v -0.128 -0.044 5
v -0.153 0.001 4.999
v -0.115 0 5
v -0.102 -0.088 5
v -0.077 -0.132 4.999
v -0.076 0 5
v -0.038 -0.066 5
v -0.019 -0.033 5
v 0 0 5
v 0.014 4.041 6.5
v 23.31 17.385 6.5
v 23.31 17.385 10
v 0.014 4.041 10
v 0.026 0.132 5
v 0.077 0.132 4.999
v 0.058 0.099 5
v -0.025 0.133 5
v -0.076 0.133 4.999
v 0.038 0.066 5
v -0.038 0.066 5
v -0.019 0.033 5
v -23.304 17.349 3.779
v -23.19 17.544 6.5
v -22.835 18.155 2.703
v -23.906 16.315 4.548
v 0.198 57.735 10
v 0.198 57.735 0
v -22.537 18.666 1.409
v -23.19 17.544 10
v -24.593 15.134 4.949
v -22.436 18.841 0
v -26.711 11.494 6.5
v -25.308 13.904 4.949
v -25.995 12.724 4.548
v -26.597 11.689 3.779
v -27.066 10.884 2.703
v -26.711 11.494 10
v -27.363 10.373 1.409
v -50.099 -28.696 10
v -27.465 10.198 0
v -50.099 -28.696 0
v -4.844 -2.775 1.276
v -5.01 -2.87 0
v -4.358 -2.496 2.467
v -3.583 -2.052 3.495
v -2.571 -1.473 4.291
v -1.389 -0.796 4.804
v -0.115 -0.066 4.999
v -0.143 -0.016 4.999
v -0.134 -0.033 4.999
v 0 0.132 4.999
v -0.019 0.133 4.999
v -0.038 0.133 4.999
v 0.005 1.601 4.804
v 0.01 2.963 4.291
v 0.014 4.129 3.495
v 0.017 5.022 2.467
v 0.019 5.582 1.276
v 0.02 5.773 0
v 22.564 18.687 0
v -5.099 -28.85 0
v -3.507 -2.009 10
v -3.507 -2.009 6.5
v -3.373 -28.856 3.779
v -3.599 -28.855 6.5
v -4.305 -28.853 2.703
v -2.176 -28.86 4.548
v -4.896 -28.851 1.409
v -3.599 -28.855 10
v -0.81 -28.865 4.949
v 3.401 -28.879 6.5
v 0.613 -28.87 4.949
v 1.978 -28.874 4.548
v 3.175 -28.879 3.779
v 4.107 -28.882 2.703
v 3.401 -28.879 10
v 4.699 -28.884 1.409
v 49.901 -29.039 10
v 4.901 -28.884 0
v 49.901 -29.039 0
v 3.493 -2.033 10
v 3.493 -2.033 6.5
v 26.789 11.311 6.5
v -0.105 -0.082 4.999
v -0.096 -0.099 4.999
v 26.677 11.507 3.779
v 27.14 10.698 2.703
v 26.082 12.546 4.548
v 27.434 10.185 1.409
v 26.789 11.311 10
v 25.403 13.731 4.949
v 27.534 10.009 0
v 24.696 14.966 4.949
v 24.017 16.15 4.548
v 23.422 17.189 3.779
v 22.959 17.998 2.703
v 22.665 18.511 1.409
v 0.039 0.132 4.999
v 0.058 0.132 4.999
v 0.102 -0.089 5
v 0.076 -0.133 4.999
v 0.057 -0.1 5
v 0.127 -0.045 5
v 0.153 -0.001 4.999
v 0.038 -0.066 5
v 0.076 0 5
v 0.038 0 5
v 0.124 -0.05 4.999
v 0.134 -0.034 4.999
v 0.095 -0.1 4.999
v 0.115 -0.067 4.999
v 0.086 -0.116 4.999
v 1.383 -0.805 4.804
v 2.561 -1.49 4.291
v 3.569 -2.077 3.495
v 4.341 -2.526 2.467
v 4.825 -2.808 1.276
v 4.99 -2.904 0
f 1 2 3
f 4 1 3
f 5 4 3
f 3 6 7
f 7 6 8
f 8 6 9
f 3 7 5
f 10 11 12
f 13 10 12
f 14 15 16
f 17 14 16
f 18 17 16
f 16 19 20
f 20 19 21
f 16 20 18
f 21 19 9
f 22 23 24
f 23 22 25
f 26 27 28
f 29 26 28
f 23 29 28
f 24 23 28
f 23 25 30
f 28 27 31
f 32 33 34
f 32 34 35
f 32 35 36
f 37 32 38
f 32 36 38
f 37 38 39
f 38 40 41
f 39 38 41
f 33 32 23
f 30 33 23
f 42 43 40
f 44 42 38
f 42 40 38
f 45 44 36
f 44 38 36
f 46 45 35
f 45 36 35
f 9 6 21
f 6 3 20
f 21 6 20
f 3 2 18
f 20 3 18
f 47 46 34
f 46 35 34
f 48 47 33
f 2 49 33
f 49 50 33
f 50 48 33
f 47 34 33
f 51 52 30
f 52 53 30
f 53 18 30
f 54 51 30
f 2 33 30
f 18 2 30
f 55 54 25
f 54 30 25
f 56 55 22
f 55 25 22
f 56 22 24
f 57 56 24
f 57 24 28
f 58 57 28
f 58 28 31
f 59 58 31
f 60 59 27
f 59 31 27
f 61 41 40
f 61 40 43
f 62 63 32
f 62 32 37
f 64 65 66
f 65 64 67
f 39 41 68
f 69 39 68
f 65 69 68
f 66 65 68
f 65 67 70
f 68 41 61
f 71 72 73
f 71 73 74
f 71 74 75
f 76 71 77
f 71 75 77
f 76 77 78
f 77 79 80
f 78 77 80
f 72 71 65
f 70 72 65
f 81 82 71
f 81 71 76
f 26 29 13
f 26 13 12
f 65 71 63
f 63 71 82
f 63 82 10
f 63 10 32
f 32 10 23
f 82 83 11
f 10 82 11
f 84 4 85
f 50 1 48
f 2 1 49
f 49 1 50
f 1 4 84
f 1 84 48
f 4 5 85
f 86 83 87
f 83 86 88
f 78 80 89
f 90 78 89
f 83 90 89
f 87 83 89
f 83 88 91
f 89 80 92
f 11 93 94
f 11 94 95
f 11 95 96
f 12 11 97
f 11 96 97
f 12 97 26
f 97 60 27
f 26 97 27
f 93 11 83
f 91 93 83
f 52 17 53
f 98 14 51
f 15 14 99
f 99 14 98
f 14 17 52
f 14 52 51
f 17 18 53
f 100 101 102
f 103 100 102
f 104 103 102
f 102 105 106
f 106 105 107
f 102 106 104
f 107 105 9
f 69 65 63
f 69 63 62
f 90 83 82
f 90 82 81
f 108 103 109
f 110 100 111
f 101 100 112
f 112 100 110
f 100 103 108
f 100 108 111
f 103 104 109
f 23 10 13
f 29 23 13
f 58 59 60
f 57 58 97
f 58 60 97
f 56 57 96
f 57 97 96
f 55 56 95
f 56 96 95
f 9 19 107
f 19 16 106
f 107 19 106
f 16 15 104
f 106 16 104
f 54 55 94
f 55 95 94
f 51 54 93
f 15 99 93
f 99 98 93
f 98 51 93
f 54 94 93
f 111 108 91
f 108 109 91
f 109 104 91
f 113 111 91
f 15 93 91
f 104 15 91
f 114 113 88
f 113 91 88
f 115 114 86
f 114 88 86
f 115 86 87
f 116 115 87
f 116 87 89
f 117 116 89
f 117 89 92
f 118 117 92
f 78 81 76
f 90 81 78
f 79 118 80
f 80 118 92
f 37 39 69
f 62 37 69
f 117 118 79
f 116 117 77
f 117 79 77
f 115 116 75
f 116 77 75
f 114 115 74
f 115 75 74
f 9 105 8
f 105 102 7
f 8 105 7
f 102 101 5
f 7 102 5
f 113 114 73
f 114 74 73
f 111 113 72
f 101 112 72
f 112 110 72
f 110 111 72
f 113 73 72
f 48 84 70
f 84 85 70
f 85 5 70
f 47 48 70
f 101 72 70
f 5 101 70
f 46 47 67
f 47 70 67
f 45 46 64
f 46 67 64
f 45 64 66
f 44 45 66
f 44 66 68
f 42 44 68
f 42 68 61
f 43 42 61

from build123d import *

# Parameters (mm, degrees)
F1_DEPTH  = 10
F3_DEPTH  = 29
F5_DEPTH  = 29
F7_DEPTH  = 29
F8_W      = 7
F8_H      = 3.5
F9_DEPTH  = 29
F10_W     = 7
F10_H     = 3.5
F11_DEPTH = 29
F12_W     = 7
F12_H     = 3.5
F13_DEPTH = 29


with BuildPart() as f1:
    # F0 (on Top) → F1 (new body)
    with BuildSketch(Plane.XY):
        Polygon((49.9008693401, -29.0385359899), (0.1976751859, 57.7346885144), (-50.098544526, -28.6961525245), align=None)
    extrude(amount=F1_DEPTH)

    # F2 (on face) → F3 (cut)
    with BuildSketch(Plane(origin=(-0.0988375929, -28.8673442572, 0), x_dir=(0.9999941387, -0.0034238347, 0), z_dir=(-0.0034238347, -0.9999941387, 0))):
        with BuildLine():
            Line((-5, 0), (5, 0))
            ThreePointArc((5, 0), (0, 5), (-5, 0))
        make_face()
    extrude(amount=-F3_DEPTH, mode=Mode.SUBTRACT)

    # F4 (on face) → F5 (cut)
    with BuildSketch(Plane(origin=(-24.9504346701, 14.5192679949, 0), x_dir=(-0.5029621971, -0.8643084104, 0), z_dir=(-0.8643084104, 0.5029621971, 0))):
        with BuildLine():
            Line((-5, 0), (5, 0))
            ThreePointArc((5, 0), (0, 5), (-5, 0))
        make_face()
    extrude(amount=-F5_DEPTH, mode=Mode.SUBTRACT)

    # F6 (on face) → F7 (cut)
    with BuildSketch(Plane(origin=(25.049272263, 14.3480762623, 0), x_dir=(-0.4970319415, 0.867732245, 0), z_dir=(0.867732245, 0.4970319415, 0))):
        with BuildLine():
            Line((-5, 0), (5, 0))
            ThreePointArc((5, 0), (0, 5), (-5, 0))
        make_face()
    extrude(amount=-F7_DEPTH, mode=Mode.SUBTRACT)

    # F8 (on face) → F9 (cut)
    with BuildSketch(Plane(origin=(25.049272263, 14.3480762623, 0), x_dir=(-0.4970319415, 0.867732245, 0), z_dir=(0.867732245, 0.4970319415, 0))):
        with Locations((0, 8.25)):
            Rectangle(F8_W, F8_H)
    extrude(amount=-F9_DEPTH, mode=Mode.SUBTRACT)

    # F10 (on face) → F11 (cut)
    with BuildSketch(Plane(origin=(-24.9504346701, 14.5192679949, 0), x_dir=(-0.5029621971, -0.8643084104, 0), z_dir=(-0.8643084104, 0.5029621971, 0))):
        with Locations((0, 8.25)):
            Rectangle(F10_W, F10_H)
    extrude(amount=-F11_DEPTH, mode=Mode.SUBTRACT)

    # F12 (on face) → F13 (cut)
    with BuildSketch(Plane(origin=(-0.0988375929, -28.8673442572, 0), x_dir=(0.9999941387, -0.0034238347, 0), z_dir=(-0.0034238347, -0.9999941387, 0))):
        with Locations((0, 8.25)):
            Rectangle(F12_W, F12_H)
    extrude(amount=-F13_DEPTH, mode=Mode.SUBTRACT)


solid = f1.part
